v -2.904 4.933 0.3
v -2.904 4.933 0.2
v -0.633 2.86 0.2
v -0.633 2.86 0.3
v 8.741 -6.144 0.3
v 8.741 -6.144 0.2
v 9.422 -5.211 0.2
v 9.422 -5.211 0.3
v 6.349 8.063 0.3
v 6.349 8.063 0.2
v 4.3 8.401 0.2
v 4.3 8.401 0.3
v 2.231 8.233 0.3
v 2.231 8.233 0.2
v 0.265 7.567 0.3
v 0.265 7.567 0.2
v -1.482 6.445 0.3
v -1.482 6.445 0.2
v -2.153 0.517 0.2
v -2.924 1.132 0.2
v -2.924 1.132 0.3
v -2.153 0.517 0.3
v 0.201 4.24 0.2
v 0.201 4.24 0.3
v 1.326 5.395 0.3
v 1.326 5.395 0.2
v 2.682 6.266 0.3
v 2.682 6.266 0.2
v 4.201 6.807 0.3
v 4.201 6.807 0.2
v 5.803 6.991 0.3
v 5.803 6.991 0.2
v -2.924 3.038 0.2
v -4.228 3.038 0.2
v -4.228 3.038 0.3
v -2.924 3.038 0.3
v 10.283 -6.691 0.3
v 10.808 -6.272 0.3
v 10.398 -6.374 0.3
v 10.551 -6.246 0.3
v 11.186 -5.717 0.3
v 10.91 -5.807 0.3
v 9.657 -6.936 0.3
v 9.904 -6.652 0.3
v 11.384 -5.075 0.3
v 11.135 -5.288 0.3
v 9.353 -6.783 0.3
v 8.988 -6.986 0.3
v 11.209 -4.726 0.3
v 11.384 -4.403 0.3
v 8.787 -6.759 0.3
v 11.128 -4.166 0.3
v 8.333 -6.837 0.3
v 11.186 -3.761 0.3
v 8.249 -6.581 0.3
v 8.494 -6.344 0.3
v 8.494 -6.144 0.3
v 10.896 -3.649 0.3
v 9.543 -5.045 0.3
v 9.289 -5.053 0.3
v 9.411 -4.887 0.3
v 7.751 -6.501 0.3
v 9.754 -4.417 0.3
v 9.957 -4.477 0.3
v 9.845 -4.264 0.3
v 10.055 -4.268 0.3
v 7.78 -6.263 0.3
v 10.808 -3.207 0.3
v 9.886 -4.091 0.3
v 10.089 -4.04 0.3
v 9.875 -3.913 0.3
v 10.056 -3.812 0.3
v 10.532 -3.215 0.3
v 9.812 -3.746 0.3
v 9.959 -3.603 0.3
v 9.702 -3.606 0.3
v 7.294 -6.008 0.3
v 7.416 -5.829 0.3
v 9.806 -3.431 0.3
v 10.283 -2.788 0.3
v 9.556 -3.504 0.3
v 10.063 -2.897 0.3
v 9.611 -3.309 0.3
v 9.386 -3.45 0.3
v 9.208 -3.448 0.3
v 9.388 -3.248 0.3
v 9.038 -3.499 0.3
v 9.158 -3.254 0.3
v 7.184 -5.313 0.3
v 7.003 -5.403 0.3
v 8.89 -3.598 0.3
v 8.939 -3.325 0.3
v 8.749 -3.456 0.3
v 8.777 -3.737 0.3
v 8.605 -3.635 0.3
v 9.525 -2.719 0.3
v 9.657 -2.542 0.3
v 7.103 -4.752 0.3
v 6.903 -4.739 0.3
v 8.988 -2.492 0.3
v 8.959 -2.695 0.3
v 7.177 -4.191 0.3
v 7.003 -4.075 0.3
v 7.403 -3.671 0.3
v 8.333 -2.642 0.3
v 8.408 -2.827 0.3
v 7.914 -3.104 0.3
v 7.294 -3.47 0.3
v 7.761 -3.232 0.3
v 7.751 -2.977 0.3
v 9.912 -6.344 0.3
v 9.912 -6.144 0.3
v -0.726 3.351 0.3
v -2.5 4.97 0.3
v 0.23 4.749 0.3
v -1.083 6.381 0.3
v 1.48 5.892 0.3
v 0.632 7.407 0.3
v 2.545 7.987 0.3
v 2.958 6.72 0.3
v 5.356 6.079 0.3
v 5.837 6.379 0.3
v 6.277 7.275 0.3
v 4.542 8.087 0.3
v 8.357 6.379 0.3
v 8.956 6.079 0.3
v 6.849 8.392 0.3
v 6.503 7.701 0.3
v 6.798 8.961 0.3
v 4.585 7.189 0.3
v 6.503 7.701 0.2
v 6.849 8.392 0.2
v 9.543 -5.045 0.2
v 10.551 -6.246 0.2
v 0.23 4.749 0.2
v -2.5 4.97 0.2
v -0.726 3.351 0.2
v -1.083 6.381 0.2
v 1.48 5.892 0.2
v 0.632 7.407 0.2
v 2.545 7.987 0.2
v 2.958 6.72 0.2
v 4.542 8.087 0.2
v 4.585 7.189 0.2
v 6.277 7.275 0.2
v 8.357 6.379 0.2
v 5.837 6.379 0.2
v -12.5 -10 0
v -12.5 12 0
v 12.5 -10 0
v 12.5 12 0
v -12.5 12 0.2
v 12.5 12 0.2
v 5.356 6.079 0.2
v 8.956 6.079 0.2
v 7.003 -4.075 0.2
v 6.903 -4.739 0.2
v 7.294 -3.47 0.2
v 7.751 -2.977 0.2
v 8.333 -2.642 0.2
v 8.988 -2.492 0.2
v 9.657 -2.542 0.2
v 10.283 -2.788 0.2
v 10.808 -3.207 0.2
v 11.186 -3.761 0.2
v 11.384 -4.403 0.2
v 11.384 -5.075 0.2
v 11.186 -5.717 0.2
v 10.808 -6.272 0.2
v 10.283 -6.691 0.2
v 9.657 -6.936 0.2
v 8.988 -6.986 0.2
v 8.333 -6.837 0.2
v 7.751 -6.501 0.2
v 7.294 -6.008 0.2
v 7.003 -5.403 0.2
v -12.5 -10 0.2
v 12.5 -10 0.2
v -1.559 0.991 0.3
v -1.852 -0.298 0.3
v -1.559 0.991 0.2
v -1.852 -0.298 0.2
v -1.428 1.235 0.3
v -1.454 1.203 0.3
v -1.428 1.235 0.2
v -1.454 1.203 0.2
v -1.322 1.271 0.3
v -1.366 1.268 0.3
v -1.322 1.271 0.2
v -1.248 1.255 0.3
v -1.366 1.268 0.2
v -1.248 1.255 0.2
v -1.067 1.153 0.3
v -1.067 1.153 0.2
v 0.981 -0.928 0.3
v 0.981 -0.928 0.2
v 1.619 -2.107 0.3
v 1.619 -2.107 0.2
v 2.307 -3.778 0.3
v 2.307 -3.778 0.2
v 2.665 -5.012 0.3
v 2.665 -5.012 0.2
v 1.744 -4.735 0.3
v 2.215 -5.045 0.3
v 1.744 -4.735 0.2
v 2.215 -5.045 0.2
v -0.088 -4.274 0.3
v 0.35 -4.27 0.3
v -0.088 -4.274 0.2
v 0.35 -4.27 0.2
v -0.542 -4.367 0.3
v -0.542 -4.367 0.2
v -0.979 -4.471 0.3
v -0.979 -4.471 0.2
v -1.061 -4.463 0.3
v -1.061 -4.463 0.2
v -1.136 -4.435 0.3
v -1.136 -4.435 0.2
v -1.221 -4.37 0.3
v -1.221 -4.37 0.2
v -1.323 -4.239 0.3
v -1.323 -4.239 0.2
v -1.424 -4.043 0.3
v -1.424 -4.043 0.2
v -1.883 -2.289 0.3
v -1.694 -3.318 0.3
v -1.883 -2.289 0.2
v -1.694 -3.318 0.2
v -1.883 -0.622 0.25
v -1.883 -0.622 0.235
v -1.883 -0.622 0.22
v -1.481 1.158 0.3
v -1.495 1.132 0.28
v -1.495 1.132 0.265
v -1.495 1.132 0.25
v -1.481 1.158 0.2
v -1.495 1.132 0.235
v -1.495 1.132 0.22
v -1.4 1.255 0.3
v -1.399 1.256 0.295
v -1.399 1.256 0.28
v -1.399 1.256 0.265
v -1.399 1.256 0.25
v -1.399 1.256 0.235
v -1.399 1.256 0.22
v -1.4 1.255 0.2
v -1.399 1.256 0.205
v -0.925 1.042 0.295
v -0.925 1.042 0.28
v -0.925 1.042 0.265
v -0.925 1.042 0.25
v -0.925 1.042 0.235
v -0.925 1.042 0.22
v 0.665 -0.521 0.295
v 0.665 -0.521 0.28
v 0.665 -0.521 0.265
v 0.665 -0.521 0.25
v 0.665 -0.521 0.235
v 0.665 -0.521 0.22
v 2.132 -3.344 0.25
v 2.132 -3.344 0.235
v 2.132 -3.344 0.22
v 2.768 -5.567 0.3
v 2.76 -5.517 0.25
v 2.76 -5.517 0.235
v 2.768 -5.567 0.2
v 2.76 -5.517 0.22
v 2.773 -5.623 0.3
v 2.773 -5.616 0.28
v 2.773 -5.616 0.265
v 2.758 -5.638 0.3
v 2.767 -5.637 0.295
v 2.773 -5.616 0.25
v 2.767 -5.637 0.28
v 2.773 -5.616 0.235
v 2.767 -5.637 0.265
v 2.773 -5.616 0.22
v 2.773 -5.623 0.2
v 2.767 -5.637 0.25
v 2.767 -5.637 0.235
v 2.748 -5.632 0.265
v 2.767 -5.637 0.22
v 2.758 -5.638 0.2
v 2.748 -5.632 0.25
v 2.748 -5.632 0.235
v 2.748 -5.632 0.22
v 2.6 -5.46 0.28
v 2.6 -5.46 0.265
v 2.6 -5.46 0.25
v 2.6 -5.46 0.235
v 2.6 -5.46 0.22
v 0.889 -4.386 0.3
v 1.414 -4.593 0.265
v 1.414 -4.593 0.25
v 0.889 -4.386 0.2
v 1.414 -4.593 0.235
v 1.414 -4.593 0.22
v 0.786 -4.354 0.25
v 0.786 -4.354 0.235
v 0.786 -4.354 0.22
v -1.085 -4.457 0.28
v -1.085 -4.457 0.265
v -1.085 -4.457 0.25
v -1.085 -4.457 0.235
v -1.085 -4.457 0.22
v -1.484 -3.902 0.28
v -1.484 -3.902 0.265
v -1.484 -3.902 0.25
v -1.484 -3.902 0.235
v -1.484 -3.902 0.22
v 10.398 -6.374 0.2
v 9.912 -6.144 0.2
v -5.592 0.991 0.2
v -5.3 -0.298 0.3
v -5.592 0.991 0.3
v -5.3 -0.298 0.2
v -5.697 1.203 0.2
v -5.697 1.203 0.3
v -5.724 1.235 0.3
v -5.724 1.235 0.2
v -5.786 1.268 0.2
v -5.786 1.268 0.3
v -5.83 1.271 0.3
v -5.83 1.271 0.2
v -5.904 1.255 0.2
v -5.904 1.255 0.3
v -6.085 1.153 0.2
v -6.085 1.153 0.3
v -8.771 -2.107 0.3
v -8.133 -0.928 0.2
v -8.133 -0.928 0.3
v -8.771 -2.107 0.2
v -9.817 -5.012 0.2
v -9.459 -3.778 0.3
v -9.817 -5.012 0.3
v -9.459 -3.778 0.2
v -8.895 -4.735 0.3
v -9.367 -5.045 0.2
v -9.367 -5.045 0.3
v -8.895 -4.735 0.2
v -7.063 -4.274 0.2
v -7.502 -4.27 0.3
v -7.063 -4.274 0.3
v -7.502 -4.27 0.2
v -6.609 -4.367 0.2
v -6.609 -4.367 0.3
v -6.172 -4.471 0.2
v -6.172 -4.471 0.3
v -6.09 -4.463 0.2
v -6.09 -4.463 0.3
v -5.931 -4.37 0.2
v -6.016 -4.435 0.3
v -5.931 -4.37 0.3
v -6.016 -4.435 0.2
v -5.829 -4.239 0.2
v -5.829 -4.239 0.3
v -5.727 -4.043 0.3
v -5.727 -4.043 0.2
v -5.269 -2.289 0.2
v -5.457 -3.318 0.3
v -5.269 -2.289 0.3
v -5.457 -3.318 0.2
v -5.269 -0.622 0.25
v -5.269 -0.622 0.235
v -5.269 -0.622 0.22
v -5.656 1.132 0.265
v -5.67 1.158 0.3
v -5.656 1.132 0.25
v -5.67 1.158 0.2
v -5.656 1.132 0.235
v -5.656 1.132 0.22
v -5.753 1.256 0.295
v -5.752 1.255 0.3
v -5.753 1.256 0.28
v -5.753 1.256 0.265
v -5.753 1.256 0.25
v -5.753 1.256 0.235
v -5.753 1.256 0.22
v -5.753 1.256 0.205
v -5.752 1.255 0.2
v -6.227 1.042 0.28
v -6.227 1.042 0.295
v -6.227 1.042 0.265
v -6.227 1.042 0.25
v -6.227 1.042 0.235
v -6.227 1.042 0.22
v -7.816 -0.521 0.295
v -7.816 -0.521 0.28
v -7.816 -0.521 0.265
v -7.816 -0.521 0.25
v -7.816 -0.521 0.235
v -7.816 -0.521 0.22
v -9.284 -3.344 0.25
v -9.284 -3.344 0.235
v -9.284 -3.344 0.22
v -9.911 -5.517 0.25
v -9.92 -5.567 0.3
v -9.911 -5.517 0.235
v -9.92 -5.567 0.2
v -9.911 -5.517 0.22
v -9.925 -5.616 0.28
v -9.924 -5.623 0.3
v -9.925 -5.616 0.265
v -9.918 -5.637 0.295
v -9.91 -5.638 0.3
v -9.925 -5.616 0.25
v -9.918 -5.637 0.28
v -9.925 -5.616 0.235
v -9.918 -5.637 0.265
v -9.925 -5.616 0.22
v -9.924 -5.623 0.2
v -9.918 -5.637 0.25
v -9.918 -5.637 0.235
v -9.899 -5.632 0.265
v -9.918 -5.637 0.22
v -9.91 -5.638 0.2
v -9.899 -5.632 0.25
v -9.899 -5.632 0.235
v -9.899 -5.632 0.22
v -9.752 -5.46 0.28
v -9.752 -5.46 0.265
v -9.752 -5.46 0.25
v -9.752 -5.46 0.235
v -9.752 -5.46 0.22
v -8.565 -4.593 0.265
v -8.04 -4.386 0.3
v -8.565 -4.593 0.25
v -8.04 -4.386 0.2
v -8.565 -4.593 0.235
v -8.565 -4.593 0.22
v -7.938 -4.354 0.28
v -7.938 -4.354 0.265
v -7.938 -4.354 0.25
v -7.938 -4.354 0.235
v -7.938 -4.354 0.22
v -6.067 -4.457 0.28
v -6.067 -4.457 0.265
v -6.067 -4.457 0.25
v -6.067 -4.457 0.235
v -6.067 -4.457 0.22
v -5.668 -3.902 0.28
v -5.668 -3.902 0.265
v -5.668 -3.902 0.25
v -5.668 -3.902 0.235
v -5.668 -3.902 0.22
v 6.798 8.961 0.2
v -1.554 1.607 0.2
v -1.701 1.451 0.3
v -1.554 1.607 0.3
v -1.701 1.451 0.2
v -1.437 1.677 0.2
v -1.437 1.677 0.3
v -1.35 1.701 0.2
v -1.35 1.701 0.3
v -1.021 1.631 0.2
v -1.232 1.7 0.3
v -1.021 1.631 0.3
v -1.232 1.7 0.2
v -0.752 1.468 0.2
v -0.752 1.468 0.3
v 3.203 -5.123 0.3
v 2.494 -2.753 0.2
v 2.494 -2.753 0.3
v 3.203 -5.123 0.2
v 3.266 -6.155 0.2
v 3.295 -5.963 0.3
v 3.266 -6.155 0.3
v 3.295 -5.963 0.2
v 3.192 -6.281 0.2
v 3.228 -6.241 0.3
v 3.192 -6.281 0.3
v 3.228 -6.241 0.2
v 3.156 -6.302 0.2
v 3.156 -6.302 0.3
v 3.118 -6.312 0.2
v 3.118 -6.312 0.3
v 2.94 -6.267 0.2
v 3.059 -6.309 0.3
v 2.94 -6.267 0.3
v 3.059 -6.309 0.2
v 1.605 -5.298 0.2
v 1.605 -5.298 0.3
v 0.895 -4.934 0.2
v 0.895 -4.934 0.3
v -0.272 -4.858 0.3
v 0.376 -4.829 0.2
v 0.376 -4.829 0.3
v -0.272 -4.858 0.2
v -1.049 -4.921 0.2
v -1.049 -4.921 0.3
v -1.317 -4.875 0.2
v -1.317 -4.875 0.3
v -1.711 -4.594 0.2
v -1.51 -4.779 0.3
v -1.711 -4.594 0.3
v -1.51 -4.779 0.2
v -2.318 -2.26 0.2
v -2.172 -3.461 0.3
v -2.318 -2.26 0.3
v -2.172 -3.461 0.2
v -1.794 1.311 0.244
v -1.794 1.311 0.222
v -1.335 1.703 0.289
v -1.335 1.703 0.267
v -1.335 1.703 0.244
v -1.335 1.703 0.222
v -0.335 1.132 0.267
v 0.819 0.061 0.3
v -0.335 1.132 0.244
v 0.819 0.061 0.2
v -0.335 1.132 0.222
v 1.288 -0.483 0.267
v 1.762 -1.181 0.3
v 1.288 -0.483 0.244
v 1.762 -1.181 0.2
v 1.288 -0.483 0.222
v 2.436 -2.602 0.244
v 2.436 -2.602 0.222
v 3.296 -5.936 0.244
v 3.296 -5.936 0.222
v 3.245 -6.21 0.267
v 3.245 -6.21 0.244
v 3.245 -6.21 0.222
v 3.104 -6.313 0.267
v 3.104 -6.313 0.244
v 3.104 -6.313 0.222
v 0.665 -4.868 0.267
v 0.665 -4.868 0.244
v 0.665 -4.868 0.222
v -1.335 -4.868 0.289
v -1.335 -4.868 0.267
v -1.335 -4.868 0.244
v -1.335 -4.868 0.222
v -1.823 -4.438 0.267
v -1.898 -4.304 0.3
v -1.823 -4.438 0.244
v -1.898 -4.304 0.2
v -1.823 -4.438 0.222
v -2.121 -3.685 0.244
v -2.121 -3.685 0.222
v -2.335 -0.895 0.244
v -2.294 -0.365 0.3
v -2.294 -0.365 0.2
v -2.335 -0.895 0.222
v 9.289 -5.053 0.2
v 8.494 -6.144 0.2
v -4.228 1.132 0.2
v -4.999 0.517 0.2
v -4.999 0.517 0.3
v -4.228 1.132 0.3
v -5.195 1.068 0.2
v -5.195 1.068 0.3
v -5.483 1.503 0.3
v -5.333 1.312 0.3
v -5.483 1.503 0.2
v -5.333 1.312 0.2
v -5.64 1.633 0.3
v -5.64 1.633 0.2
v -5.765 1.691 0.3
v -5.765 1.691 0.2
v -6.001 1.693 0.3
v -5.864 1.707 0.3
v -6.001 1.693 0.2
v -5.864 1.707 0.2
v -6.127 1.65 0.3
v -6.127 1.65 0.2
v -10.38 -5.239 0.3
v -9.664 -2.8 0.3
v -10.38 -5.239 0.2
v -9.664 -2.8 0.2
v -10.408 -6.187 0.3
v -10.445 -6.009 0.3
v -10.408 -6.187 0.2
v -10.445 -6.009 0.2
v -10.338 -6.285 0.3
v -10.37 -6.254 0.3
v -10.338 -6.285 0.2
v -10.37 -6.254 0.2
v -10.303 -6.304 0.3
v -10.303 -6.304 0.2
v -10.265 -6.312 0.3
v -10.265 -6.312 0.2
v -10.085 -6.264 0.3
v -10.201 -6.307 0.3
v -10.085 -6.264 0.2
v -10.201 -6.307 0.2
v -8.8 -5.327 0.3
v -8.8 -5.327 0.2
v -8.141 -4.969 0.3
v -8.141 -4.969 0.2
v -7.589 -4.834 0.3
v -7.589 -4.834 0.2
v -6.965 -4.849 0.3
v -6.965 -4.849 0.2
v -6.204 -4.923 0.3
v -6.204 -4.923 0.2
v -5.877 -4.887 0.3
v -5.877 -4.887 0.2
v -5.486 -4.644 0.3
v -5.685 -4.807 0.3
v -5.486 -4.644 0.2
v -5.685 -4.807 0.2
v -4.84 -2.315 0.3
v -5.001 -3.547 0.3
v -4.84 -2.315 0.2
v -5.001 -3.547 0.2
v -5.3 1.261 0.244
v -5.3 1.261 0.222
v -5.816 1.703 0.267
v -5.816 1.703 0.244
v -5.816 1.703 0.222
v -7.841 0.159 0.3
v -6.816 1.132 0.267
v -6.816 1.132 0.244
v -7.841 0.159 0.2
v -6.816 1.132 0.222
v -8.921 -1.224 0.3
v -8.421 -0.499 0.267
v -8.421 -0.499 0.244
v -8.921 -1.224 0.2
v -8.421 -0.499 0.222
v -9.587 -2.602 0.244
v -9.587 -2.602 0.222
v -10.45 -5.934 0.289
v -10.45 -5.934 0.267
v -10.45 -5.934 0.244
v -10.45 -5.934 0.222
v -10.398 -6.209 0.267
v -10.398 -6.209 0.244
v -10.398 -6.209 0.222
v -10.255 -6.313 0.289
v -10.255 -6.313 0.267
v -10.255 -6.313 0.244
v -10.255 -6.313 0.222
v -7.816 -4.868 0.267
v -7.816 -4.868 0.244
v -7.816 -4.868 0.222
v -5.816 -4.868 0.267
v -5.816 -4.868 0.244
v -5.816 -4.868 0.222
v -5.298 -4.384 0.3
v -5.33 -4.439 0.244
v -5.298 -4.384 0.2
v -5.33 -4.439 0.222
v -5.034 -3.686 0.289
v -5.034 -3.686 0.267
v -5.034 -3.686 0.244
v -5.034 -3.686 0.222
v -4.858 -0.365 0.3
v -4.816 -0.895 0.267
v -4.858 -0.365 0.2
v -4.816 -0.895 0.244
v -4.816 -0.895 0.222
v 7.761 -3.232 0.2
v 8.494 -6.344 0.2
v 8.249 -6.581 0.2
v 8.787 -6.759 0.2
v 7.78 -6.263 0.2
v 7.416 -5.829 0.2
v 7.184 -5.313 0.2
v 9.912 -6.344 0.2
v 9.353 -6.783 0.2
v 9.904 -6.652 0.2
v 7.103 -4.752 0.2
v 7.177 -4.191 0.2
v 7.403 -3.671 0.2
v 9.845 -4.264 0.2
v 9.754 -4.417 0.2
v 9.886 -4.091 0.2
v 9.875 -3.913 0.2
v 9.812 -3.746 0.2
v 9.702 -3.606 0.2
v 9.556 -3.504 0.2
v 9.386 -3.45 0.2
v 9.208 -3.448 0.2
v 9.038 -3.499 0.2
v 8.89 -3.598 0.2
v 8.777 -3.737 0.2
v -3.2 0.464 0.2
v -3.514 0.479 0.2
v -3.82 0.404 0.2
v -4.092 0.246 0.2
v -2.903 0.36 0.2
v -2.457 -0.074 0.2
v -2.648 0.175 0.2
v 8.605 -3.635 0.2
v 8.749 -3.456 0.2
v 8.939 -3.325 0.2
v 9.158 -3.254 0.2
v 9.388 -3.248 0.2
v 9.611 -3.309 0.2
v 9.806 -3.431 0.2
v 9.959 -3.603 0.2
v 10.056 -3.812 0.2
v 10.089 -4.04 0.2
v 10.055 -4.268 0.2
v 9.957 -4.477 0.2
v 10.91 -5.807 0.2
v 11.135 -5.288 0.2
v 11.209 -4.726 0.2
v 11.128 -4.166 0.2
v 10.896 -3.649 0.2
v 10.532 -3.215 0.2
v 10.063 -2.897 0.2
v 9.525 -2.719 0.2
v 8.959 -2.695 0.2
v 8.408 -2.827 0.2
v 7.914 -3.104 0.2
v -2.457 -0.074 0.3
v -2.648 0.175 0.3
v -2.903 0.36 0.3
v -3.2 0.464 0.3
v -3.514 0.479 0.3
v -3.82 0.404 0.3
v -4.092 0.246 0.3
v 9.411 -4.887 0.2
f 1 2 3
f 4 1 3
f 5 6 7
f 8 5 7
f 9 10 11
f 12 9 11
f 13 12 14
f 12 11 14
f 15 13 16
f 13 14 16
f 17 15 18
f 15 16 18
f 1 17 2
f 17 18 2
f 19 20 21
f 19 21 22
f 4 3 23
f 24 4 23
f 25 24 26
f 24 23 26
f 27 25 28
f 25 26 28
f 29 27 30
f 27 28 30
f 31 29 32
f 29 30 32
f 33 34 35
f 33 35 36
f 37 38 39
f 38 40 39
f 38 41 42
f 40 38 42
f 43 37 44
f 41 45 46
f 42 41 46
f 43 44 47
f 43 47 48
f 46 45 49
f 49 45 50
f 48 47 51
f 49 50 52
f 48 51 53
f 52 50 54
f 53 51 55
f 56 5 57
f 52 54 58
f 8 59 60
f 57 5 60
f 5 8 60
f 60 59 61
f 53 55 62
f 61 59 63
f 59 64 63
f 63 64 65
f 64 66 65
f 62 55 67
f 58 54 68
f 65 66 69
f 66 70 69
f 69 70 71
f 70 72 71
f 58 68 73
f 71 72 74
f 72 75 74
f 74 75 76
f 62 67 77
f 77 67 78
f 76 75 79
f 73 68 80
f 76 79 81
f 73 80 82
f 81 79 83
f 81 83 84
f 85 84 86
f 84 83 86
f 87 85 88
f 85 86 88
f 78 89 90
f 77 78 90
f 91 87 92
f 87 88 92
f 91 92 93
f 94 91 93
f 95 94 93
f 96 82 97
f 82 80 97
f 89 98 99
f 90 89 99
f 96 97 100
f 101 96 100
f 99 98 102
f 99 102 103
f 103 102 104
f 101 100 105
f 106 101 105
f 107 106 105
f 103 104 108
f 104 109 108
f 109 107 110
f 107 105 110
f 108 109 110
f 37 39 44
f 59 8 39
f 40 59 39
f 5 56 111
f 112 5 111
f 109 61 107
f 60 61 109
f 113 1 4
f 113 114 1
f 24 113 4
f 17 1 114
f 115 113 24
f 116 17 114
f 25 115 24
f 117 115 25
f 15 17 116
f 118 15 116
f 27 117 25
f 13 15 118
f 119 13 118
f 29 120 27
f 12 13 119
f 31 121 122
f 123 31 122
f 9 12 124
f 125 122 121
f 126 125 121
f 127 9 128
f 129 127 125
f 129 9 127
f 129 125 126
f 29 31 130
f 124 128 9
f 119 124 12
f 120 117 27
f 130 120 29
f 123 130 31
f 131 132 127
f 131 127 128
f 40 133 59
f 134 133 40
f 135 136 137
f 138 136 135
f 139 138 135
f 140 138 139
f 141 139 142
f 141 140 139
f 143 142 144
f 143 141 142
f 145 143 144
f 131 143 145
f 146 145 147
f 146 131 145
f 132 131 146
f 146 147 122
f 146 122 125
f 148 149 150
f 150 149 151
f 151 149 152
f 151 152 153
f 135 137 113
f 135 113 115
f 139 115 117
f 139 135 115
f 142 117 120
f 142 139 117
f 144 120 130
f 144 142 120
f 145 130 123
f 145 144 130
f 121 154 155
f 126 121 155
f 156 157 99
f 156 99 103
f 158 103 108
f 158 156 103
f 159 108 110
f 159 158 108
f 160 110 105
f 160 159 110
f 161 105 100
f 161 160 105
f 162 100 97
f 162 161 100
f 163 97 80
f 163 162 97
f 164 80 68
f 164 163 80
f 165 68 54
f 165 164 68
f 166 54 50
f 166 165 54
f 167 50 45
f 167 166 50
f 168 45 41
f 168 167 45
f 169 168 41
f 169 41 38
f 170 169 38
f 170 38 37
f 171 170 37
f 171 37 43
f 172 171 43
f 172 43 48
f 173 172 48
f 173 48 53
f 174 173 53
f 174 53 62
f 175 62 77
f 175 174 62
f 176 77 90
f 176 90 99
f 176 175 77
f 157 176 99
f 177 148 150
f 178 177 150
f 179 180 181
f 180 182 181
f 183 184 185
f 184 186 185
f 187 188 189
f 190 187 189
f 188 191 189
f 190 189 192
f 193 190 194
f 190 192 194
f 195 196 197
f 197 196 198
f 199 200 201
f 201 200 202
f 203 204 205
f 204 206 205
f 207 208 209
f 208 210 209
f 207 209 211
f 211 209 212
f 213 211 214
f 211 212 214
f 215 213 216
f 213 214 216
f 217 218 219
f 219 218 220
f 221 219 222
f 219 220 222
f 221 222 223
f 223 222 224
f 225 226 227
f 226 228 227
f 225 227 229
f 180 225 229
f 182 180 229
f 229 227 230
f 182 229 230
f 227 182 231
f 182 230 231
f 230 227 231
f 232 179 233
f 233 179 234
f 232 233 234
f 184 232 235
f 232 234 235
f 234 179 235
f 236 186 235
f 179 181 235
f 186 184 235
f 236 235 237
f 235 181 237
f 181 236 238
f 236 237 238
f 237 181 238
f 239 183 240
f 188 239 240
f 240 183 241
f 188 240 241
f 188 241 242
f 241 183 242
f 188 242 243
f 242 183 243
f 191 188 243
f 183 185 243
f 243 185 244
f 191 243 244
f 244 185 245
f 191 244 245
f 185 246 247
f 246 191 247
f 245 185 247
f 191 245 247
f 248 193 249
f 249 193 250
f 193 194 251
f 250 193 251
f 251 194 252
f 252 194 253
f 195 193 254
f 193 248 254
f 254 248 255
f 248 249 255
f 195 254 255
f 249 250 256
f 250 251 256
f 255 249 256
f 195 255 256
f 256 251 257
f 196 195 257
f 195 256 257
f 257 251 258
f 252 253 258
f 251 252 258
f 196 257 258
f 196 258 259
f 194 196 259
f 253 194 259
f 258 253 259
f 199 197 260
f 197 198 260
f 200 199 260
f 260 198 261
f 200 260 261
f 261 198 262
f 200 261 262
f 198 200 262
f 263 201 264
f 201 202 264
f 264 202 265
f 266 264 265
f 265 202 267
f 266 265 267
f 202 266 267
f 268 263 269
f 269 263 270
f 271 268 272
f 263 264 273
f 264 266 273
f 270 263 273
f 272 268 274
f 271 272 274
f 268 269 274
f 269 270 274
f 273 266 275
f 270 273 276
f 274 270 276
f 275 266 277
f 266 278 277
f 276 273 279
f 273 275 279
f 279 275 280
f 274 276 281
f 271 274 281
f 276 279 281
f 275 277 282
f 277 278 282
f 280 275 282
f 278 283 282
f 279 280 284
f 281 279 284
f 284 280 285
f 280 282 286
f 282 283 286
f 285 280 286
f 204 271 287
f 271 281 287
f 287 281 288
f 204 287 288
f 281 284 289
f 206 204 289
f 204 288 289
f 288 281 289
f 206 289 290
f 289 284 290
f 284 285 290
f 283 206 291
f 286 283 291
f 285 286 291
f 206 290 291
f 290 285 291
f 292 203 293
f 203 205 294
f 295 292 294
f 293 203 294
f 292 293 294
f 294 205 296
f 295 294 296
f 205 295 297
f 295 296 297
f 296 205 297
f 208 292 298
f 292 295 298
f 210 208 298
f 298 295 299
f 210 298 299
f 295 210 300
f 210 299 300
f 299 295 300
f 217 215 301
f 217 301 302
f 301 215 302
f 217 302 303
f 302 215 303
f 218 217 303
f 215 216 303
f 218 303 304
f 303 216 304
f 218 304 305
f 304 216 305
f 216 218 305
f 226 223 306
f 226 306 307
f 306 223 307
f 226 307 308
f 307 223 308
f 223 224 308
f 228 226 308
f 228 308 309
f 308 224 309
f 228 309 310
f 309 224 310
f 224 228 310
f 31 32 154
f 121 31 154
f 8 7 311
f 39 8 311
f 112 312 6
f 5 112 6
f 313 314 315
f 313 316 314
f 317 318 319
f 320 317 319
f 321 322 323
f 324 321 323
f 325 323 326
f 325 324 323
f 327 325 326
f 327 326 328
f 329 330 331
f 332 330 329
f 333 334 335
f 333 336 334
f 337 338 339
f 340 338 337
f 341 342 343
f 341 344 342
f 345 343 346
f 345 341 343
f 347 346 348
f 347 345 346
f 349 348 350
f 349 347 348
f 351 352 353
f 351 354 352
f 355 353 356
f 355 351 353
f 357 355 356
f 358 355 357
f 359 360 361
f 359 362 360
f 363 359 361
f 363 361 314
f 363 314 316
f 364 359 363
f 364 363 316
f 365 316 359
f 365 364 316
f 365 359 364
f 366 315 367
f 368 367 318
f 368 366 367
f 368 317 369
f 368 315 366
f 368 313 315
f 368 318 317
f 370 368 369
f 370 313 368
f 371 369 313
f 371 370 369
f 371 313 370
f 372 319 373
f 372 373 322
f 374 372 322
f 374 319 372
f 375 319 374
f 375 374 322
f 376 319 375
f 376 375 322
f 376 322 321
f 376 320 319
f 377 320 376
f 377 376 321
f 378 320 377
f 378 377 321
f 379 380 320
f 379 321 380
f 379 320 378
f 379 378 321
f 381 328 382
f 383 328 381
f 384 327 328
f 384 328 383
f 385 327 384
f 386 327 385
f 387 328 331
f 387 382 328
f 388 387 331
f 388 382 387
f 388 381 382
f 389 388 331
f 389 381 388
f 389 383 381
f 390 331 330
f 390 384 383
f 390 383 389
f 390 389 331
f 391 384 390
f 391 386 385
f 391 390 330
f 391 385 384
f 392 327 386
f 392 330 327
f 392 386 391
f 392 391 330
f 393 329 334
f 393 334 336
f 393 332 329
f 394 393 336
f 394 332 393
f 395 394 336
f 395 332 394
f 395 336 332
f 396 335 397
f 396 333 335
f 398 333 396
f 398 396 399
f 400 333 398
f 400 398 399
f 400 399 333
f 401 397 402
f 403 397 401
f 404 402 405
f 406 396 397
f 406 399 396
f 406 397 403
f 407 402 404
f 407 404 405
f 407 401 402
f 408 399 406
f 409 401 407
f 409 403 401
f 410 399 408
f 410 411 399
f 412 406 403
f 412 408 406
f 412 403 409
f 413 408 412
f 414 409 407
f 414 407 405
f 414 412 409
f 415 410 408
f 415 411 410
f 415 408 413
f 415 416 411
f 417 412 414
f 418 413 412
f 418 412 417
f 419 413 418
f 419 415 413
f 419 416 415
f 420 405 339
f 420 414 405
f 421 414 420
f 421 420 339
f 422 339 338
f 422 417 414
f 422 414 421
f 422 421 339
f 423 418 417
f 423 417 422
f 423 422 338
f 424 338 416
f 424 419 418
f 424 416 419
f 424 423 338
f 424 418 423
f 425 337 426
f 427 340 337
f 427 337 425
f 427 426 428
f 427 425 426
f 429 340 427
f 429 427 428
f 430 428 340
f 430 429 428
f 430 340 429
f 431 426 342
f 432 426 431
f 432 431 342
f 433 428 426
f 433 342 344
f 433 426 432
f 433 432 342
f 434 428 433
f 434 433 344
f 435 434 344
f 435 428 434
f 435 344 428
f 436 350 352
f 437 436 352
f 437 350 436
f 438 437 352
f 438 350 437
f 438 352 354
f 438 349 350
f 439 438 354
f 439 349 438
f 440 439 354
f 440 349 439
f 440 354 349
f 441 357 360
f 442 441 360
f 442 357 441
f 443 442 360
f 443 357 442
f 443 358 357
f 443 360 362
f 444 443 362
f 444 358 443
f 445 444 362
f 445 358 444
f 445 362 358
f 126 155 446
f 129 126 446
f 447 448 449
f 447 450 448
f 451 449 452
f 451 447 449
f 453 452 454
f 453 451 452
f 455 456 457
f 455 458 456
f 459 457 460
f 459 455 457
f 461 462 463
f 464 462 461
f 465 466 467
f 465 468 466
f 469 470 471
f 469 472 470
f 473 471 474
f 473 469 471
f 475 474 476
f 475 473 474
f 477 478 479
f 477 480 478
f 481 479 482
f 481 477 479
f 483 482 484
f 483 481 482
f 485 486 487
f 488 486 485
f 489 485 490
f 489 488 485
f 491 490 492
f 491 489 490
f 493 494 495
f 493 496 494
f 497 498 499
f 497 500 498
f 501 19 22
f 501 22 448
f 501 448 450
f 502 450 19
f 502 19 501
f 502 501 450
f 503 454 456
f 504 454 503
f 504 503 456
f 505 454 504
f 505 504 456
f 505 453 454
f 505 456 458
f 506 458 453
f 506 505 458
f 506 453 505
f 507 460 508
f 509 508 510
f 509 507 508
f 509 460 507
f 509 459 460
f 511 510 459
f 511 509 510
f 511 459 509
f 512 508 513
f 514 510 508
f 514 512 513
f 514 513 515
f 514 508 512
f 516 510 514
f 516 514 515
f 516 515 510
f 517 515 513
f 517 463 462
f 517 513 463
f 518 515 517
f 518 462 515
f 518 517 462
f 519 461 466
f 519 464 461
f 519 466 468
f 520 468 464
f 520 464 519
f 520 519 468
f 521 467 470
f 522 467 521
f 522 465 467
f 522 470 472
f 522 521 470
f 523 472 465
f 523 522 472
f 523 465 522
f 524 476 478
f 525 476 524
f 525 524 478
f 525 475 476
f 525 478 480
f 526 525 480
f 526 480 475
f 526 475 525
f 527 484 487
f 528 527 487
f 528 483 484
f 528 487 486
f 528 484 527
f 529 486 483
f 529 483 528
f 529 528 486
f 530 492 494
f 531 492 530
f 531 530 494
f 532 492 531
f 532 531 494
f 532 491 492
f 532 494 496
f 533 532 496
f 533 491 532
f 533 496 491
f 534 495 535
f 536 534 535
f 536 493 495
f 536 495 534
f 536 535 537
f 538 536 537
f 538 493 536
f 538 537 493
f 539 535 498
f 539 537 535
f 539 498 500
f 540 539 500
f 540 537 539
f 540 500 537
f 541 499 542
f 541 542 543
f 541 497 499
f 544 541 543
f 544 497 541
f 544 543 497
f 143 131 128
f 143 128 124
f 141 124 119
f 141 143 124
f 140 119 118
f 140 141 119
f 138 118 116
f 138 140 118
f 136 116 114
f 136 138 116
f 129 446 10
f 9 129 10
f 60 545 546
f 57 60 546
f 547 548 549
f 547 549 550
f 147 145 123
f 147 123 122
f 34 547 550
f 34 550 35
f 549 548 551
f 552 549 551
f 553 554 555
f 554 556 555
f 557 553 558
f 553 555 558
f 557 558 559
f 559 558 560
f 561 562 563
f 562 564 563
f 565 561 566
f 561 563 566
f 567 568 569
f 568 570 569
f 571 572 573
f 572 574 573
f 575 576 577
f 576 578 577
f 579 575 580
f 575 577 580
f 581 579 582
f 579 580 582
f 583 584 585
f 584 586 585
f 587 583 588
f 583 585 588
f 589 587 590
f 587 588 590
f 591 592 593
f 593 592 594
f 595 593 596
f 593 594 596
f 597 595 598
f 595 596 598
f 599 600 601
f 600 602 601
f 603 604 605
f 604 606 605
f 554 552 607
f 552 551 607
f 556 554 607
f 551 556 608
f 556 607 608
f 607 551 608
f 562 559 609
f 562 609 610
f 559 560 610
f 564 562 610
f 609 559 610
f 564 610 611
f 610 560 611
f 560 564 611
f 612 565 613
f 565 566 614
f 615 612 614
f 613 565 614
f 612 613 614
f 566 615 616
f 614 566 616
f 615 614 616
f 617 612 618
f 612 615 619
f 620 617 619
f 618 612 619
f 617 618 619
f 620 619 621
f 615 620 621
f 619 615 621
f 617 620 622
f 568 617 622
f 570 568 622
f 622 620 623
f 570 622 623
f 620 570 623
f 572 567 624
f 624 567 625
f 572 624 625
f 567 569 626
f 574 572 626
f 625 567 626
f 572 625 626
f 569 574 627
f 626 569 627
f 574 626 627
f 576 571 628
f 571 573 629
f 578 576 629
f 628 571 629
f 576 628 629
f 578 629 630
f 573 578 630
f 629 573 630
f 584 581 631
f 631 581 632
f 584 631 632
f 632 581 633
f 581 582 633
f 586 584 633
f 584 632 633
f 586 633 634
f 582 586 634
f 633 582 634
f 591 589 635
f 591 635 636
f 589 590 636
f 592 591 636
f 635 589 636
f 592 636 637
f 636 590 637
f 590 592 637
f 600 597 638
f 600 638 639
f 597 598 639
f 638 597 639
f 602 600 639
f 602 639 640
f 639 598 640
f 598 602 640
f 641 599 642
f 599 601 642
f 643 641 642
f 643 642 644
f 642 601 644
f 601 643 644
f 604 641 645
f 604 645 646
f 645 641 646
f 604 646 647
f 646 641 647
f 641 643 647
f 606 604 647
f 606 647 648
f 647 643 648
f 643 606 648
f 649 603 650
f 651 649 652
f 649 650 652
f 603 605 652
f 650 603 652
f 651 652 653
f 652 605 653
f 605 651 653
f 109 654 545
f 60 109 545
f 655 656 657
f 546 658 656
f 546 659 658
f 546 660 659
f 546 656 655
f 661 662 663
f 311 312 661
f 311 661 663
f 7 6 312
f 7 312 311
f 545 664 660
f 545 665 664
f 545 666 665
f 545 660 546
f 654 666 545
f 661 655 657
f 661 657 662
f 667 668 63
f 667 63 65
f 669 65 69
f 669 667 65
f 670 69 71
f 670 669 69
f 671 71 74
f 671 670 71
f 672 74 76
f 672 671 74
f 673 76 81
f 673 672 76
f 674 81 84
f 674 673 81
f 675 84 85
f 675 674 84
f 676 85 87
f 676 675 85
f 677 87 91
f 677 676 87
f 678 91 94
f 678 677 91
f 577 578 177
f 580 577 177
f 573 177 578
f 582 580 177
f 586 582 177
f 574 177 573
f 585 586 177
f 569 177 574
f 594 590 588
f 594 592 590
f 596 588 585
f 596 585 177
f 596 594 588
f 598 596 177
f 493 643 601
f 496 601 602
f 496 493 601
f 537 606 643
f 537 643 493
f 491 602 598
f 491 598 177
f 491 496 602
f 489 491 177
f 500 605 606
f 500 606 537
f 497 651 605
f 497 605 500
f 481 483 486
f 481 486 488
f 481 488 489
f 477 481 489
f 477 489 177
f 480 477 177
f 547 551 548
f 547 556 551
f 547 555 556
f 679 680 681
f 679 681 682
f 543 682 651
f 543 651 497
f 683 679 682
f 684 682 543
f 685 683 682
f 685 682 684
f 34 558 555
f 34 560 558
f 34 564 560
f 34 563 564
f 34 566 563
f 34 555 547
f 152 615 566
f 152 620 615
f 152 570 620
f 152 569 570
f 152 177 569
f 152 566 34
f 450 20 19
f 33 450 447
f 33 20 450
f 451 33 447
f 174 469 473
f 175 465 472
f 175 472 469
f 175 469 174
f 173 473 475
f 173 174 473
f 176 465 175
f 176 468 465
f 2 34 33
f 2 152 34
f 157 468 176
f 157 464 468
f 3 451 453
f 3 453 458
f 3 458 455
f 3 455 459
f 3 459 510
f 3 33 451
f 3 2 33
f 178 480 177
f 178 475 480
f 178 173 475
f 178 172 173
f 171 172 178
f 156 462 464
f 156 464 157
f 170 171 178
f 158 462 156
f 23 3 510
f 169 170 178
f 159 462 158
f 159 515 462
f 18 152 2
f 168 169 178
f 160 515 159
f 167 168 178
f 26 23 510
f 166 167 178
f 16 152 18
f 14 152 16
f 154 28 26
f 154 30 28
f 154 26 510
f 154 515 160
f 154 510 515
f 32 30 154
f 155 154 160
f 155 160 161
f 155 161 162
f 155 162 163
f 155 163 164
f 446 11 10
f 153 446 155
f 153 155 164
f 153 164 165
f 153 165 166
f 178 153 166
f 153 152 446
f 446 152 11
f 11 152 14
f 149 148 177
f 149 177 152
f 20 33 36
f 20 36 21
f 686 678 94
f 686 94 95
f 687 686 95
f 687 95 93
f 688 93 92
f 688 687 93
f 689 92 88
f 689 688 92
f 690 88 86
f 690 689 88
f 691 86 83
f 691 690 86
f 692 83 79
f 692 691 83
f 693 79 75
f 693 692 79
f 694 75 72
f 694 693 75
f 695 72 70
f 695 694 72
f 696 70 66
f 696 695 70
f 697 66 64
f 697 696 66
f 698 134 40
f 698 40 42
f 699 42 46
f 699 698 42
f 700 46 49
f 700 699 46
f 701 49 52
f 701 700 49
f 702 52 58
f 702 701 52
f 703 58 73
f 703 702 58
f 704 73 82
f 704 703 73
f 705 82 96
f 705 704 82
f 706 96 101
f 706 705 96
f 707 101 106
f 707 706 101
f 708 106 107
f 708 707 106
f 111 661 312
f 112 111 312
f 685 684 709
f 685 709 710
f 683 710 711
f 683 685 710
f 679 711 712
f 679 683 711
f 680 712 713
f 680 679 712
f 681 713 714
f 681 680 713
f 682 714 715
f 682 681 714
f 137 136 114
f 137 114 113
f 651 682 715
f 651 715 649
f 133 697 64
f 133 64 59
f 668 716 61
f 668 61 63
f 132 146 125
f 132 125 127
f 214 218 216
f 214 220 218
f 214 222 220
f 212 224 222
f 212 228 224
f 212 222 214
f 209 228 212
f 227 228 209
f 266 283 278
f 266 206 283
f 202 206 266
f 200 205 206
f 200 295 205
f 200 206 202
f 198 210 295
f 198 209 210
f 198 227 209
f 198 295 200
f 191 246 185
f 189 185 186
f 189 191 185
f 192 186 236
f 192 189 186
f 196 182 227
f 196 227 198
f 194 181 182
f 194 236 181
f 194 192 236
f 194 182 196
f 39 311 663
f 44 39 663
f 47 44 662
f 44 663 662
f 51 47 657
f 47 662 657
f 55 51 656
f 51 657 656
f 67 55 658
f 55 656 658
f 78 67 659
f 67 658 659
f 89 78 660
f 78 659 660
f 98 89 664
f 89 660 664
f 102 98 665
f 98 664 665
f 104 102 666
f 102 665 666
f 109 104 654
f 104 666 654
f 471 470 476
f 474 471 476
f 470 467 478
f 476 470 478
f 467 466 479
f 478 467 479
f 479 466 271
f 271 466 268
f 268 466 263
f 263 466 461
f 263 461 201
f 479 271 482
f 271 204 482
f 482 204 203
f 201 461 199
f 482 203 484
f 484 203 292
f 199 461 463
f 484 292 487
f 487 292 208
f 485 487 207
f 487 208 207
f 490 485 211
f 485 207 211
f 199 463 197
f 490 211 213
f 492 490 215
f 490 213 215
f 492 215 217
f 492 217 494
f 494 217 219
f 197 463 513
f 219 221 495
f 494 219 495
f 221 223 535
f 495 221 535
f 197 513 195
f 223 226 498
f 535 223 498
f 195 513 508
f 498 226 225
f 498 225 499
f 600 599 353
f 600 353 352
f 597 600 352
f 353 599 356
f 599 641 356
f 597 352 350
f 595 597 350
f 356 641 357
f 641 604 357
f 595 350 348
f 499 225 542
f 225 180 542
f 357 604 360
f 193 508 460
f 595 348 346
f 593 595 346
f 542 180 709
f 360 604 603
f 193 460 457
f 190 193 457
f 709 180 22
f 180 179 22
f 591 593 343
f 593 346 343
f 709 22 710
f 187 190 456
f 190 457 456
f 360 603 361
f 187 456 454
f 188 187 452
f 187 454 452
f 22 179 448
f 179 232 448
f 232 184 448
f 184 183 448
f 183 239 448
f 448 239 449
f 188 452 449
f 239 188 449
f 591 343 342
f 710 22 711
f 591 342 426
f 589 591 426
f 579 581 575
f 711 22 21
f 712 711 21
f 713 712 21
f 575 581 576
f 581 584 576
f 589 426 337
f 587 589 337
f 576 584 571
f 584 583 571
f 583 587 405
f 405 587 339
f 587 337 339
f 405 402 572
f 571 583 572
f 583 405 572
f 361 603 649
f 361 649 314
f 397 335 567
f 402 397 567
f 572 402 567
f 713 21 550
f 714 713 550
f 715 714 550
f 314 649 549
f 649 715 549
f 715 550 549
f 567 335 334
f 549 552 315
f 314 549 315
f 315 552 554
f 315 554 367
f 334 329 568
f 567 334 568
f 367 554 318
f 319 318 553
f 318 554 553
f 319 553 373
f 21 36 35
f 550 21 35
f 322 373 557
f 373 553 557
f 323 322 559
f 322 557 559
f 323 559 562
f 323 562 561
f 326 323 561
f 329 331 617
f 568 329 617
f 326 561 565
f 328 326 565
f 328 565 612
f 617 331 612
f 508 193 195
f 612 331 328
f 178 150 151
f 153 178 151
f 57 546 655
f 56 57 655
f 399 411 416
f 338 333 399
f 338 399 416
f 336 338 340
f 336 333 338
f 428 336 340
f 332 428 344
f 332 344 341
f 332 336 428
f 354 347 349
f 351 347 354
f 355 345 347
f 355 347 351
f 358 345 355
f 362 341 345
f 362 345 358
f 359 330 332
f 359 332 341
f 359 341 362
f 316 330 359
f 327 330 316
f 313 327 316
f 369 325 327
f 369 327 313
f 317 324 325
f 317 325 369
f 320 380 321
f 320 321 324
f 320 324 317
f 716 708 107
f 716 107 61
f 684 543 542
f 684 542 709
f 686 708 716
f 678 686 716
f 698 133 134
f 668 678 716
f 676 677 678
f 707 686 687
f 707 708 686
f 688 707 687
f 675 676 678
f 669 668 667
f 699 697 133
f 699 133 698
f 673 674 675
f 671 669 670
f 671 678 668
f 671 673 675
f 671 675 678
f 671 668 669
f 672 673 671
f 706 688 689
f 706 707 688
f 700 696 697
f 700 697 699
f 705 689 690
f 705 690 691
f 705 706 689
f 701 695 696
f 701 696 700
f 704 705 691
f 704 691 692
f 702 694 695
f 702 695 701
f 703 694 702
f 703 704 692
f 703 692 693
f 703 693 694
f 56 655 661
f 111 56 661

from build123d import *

# Parameters (mm, degrees)
ESQUISSE1_W      = 25
ESQUISSE1_H      = 22
EXTRUSION1_DEPTH = 0.2
EXTRUSION2_DEPTH = 0.1
EXTRUSION3_DEPTH = 0.1
ESQUISSE7_R      = 2.25329073
EXTRUSION4_DEPTH = 0.1


with BuildPart() as part:
    # Esquisse1 → Extrusion1 (new body)
    with BuildSketch(Plane.XY):
        with Locations((0, 1)):
            Rectangle(ESQUISSE1_W, ESQUISSE1_H)
    extrude(amount=EXTRUSION1_DEPTH)

    # Esquisse2 → Extrusion2 (add)
    with BuildSketch(Plane(origin=(-107.948096464, -44.966627708, 0.2), x_dir=(1, 0, 0), z_dir=(0, 0, 1))):
        with BuildLine():
            Line((102.949261002, 45.483428738), (103.720282646, 46.098149022))
            Line((103.720282646, 46.098149022), (103.720282646, 48.005059554))
            Line((103.720282646, 48.005059554), (105.02429837, 48.005059554))
            Line((105.02429837, 48.005059554), (105.02429837, 46.098149022))
            Line((105.02429837, 46.098149022), (105.795320014, 45.483428738))
            add(Edge.make_bspline(
                [(105.795320014, 45.483428738), (106.023083801, 46.05765588), (106.43294977, 47.090990317), (108.793076551, 45.120355487), (110.23196293, 43.600450018), (112.009783829, 37.008242786), (108.947504044, 40.739218695), (105.920268617, 39.380722256), (105.598051775, 42.455828729), (105.603511107, 43.917341833), (105.626504017, 44.426496972), (105.654439858, 44.601399102)],
                knots=[0, 0, 0, 0, 0.070214693, 0.126352892, 0.353003696, 0.536808852, 0.674978059, 0.772477531, 0.926637732, 0.974096476, 1, 1, 1, 1], degree=3))
            Line((105.654439858, 44.601399102), (105.491421153, 44.892198605))
            ThreePointArc((105.491421153, 44.892198605), (104.747997746, 45.430406434), (103.856475694, 45.212382446))
            Line((103.856475694, 45.212382446), (103.090141159, 44.601399102))
            add(Edge.make_bspline(
                [(102.949261002, 45.483428738), (102.842554052, 45.951523367), (102.269466321, 47.127955864), (99.999312676, 45.078448352), (98.497300793, 43.613766072), (96.737810547, 37.005890047), (99.795963609, 40.739501774), (102.826647222, 39.380862809), (103.13698992, 42.454582886), (103.149087763, 43.918400822), (103.108622435, 44.42524687), (103.090141159, 44.601399102)],
                knots=[0, 0, 0, 0, 0.070214693, 0.126352892, 0.353003696, 0.536808852, 0.674978059, 0.772477531, 0.926637732, 0.974096476, 1, 1, 1, 1], degree=3))
        make_face()
        with BuildLine():
            add(Edge.make_bspline(
                [(102.679572974, 42.677460231), (102.694322887, 42.964191792), (102.664769839, 43.530935243), (102.711694999, 44.412532989), (102.544711504, 45.272935951), (102.413158048, 45.880279322), (102.156415046, 46.347626706), (101.402745499, 45.782842057), (100.935363275, 45.20503274), (99.975928518, 44.364491485), (99.269226727, 43.159426219), (98.791542376, 41.923133934), (98.256344722, 40.633875473), (98.139988834, 40.017228507), (98.000232203, 39.247709869), (98.612941698, 40.07653207), (99.098958717, 40.245840024), (100.22125792, 40.73710692), (101.049977549, 40.738734163), (101.975749608, 40.361466955), (102.46108139, 41.446476935), (102.651852646, 42.138589706), (102.679572974, 42.677460231)],
                knots=[0, 0, 0, 0, 0.04767412, 0.089922149, 0.143249841, 0.187045871, 0.193766786, 0.222787718, 0.29066554, 0.34302156, 0.41986587, 0.515238388, 0.560384071, 0.637511532, 0.643694642, 0.656745907, 0.73601935, 0.772225825, 0.843596609, 0.873535603, 0.910403382, 1, 1, 1, 1], degree=3))
        make_face(mode=Mode.SUBTRACT)
        with BuildLine():
            add(Edge.make_bspline(
                [(106.065008042, 42.677460231), (106.05025813, 42.964191792), (106.079811177, 43.530935243), (106.032886018, 44.412532989), (106.199869512, 45.272935951), (106.331422968, 45.880279322), (106.58816597, 46.347626706), (107.341835518, 45.782842057), (107.809217742, 45.20503274), (108.768652498, 44.364491485), (109.475354289, 43.159426219), (109.95303864, 41.923133934), (110.488236295, 40.633875473), (110.604592182, 40.017228507), (110.744348813, 39.247709869), (110.131639318, 40.07653207), (109.645622299, 40.245840024), (108.523323096, 40.73710692), (107.694603467, 40.738734163), (106.768831409, 40.361466955), (106.283499627, 41.446476935), (106.09272837, 42.138589706), (106.065008042, 42.677460231)],
                knots=[0, 0, 0, 0, 0.04767412, 0.089922149, 0.143249841, 0.187045871, 0.193766786, 0.222787718, 0.29066554, 0.34302156, 0.41986587, 0.515238388, 0.560384071, 0.637511532, 0.643694642, 0.656745907, 0.73601935, 0.772225825, 0.843596609, 0.873535603, 0.910403382, 1, 1, 1, 1], degree=3))
        make_face(mode=Mode.SUBTRACT)
    extrude(amount=EXTRUSION2_DEPTH)

    # Esquisse5 → Extrusion3 (add)
    with BuildSketch(Plane(origin=(-95.584444445, -42.571313251, 0.2), x_dir=(1, 0, 0), z_dir=(0, 0, 1))):
        with BuildLine():
            Line((101.387355657, 49.56200431), (100.940431274, 48.650425764))
            Line((100.940431274, 48.650425764), (104.540431274, 48.650425764))
            Line((104.540431274, 48.650425764), (102.38241868, 51.531915247))
            Line((102.38241868, 51.531915247), (101.933097969, 50.63404825))
            ThreePointArc((101.933097969, 50.63404825), (96.81203399, 50.531508337), (92.680467071, 47.503973778))
            Line((92.680467071, 47.503973778), (94.951446765, 45.431042224))
            ThreePointArc((94.951446765, 45.431042224), (97.563556138, 48.440410818), (101.387355657, 49.56200431))
        make_face()
        with BuildLine():
            Line((93.084919507, 47.540978834), (94.858699346, 45.921887211))
            ThreePointArc((94.858699346, 45.921887211), (97.779486867, 48.919838532), (101.861090542, 49.846781522))
            Line((101.861090542, 49.846781522), (101.421629516, 48.950425764))
            Line((101.421629516, 48.950425764), (103.940948338, 48.950425764))
            Line((103.940948338, 48.950425764), (102.433384951, 50.963401988))
            Line((102.433384951, 50.963401988), (102.087364838, 50.271958143))
            ThreePointArc((102.087364838, 50.271958143), (97.155330732, 50.326602443), (93.084919507, 47.540978834))
        make_face(mode=Mode.SUBTRACT)
    extrude(amount=EXTRUSION3_DEPTH)

    # Esquisse7 → Extrusion4 (add)
    with BuildSketch(Plane(origin=(0, 0, 0.2), x_dir=(-1, 0, 0), z_dir=(0, 0, -1))):
        with Locations((-9.156073865, -4.739165592)):
            Circle(ESQUISSE7_R)
        with BuildLine():
            Line((-7.91441466, -3.103841391), (-9.410700922, -4.887045919))
            Line((-9.410700922, -4.887045919), (-9.753589967, -4.417000816))
            ThreePointArc((-9.753589967, -4.417000816), (-9.633073316, -3.549480021), (-8.77747537, -3.736746535))
            Line((-8.77747537, -3.736746535), (-8.605035964, -3.63543192))
            ThreePointArc((-8.605035964, -3.63543192), (-9.712780677, -3.362568683), (-9.95747235, -4.47687505))
            Line((-9.95747235, -4.47687505), (-9.543130883, -5.044869801))
            Line((-9.543130883, -5.044869801), (-10.550941959, -6.245932271))
            ThreePointArc((-10.550941959, -6.245932271), (-10.728985819, -3.419335751), (-7.91441466, -3.103841391))
        make_face(mode=Mode.SUBTRACT)
        with BuildLine():
            Line((-7.761205772, -3.232398913), (-9.289282883, -5.0534903))
            Line((-9.289282883, -5.0534903), (-8.49367238, -6.144142881))
            Line((-8.49367238, -6.144142881), (-8.49367238, -6.344142881))
            Line((-8.49367238, -6.344142881), (-9.91181719, -6.344142881))
            Line((-9.91181719, -6.344142881), (-9.91181719, -6.144142881))
            Line((-9.91181719, -6.144142881), (-8.741231888, -6.144142881))
            Line((-8.741231888, -6.144142881), (-9.421712844, -5.211314182))
            Line((-9.421712844, -5.211314182), (-10.39773307, -6.374489793))
            ThreePointArc((-10.39773307, -6.374489793), (-7.583161911, -6.058995432), (-7.761205772, -3.232398913))
        make_face(mode=Mode.SUBTRACT)
    extrude(amount=-EXTRUSION4_DEPTH)


solid = part.part
